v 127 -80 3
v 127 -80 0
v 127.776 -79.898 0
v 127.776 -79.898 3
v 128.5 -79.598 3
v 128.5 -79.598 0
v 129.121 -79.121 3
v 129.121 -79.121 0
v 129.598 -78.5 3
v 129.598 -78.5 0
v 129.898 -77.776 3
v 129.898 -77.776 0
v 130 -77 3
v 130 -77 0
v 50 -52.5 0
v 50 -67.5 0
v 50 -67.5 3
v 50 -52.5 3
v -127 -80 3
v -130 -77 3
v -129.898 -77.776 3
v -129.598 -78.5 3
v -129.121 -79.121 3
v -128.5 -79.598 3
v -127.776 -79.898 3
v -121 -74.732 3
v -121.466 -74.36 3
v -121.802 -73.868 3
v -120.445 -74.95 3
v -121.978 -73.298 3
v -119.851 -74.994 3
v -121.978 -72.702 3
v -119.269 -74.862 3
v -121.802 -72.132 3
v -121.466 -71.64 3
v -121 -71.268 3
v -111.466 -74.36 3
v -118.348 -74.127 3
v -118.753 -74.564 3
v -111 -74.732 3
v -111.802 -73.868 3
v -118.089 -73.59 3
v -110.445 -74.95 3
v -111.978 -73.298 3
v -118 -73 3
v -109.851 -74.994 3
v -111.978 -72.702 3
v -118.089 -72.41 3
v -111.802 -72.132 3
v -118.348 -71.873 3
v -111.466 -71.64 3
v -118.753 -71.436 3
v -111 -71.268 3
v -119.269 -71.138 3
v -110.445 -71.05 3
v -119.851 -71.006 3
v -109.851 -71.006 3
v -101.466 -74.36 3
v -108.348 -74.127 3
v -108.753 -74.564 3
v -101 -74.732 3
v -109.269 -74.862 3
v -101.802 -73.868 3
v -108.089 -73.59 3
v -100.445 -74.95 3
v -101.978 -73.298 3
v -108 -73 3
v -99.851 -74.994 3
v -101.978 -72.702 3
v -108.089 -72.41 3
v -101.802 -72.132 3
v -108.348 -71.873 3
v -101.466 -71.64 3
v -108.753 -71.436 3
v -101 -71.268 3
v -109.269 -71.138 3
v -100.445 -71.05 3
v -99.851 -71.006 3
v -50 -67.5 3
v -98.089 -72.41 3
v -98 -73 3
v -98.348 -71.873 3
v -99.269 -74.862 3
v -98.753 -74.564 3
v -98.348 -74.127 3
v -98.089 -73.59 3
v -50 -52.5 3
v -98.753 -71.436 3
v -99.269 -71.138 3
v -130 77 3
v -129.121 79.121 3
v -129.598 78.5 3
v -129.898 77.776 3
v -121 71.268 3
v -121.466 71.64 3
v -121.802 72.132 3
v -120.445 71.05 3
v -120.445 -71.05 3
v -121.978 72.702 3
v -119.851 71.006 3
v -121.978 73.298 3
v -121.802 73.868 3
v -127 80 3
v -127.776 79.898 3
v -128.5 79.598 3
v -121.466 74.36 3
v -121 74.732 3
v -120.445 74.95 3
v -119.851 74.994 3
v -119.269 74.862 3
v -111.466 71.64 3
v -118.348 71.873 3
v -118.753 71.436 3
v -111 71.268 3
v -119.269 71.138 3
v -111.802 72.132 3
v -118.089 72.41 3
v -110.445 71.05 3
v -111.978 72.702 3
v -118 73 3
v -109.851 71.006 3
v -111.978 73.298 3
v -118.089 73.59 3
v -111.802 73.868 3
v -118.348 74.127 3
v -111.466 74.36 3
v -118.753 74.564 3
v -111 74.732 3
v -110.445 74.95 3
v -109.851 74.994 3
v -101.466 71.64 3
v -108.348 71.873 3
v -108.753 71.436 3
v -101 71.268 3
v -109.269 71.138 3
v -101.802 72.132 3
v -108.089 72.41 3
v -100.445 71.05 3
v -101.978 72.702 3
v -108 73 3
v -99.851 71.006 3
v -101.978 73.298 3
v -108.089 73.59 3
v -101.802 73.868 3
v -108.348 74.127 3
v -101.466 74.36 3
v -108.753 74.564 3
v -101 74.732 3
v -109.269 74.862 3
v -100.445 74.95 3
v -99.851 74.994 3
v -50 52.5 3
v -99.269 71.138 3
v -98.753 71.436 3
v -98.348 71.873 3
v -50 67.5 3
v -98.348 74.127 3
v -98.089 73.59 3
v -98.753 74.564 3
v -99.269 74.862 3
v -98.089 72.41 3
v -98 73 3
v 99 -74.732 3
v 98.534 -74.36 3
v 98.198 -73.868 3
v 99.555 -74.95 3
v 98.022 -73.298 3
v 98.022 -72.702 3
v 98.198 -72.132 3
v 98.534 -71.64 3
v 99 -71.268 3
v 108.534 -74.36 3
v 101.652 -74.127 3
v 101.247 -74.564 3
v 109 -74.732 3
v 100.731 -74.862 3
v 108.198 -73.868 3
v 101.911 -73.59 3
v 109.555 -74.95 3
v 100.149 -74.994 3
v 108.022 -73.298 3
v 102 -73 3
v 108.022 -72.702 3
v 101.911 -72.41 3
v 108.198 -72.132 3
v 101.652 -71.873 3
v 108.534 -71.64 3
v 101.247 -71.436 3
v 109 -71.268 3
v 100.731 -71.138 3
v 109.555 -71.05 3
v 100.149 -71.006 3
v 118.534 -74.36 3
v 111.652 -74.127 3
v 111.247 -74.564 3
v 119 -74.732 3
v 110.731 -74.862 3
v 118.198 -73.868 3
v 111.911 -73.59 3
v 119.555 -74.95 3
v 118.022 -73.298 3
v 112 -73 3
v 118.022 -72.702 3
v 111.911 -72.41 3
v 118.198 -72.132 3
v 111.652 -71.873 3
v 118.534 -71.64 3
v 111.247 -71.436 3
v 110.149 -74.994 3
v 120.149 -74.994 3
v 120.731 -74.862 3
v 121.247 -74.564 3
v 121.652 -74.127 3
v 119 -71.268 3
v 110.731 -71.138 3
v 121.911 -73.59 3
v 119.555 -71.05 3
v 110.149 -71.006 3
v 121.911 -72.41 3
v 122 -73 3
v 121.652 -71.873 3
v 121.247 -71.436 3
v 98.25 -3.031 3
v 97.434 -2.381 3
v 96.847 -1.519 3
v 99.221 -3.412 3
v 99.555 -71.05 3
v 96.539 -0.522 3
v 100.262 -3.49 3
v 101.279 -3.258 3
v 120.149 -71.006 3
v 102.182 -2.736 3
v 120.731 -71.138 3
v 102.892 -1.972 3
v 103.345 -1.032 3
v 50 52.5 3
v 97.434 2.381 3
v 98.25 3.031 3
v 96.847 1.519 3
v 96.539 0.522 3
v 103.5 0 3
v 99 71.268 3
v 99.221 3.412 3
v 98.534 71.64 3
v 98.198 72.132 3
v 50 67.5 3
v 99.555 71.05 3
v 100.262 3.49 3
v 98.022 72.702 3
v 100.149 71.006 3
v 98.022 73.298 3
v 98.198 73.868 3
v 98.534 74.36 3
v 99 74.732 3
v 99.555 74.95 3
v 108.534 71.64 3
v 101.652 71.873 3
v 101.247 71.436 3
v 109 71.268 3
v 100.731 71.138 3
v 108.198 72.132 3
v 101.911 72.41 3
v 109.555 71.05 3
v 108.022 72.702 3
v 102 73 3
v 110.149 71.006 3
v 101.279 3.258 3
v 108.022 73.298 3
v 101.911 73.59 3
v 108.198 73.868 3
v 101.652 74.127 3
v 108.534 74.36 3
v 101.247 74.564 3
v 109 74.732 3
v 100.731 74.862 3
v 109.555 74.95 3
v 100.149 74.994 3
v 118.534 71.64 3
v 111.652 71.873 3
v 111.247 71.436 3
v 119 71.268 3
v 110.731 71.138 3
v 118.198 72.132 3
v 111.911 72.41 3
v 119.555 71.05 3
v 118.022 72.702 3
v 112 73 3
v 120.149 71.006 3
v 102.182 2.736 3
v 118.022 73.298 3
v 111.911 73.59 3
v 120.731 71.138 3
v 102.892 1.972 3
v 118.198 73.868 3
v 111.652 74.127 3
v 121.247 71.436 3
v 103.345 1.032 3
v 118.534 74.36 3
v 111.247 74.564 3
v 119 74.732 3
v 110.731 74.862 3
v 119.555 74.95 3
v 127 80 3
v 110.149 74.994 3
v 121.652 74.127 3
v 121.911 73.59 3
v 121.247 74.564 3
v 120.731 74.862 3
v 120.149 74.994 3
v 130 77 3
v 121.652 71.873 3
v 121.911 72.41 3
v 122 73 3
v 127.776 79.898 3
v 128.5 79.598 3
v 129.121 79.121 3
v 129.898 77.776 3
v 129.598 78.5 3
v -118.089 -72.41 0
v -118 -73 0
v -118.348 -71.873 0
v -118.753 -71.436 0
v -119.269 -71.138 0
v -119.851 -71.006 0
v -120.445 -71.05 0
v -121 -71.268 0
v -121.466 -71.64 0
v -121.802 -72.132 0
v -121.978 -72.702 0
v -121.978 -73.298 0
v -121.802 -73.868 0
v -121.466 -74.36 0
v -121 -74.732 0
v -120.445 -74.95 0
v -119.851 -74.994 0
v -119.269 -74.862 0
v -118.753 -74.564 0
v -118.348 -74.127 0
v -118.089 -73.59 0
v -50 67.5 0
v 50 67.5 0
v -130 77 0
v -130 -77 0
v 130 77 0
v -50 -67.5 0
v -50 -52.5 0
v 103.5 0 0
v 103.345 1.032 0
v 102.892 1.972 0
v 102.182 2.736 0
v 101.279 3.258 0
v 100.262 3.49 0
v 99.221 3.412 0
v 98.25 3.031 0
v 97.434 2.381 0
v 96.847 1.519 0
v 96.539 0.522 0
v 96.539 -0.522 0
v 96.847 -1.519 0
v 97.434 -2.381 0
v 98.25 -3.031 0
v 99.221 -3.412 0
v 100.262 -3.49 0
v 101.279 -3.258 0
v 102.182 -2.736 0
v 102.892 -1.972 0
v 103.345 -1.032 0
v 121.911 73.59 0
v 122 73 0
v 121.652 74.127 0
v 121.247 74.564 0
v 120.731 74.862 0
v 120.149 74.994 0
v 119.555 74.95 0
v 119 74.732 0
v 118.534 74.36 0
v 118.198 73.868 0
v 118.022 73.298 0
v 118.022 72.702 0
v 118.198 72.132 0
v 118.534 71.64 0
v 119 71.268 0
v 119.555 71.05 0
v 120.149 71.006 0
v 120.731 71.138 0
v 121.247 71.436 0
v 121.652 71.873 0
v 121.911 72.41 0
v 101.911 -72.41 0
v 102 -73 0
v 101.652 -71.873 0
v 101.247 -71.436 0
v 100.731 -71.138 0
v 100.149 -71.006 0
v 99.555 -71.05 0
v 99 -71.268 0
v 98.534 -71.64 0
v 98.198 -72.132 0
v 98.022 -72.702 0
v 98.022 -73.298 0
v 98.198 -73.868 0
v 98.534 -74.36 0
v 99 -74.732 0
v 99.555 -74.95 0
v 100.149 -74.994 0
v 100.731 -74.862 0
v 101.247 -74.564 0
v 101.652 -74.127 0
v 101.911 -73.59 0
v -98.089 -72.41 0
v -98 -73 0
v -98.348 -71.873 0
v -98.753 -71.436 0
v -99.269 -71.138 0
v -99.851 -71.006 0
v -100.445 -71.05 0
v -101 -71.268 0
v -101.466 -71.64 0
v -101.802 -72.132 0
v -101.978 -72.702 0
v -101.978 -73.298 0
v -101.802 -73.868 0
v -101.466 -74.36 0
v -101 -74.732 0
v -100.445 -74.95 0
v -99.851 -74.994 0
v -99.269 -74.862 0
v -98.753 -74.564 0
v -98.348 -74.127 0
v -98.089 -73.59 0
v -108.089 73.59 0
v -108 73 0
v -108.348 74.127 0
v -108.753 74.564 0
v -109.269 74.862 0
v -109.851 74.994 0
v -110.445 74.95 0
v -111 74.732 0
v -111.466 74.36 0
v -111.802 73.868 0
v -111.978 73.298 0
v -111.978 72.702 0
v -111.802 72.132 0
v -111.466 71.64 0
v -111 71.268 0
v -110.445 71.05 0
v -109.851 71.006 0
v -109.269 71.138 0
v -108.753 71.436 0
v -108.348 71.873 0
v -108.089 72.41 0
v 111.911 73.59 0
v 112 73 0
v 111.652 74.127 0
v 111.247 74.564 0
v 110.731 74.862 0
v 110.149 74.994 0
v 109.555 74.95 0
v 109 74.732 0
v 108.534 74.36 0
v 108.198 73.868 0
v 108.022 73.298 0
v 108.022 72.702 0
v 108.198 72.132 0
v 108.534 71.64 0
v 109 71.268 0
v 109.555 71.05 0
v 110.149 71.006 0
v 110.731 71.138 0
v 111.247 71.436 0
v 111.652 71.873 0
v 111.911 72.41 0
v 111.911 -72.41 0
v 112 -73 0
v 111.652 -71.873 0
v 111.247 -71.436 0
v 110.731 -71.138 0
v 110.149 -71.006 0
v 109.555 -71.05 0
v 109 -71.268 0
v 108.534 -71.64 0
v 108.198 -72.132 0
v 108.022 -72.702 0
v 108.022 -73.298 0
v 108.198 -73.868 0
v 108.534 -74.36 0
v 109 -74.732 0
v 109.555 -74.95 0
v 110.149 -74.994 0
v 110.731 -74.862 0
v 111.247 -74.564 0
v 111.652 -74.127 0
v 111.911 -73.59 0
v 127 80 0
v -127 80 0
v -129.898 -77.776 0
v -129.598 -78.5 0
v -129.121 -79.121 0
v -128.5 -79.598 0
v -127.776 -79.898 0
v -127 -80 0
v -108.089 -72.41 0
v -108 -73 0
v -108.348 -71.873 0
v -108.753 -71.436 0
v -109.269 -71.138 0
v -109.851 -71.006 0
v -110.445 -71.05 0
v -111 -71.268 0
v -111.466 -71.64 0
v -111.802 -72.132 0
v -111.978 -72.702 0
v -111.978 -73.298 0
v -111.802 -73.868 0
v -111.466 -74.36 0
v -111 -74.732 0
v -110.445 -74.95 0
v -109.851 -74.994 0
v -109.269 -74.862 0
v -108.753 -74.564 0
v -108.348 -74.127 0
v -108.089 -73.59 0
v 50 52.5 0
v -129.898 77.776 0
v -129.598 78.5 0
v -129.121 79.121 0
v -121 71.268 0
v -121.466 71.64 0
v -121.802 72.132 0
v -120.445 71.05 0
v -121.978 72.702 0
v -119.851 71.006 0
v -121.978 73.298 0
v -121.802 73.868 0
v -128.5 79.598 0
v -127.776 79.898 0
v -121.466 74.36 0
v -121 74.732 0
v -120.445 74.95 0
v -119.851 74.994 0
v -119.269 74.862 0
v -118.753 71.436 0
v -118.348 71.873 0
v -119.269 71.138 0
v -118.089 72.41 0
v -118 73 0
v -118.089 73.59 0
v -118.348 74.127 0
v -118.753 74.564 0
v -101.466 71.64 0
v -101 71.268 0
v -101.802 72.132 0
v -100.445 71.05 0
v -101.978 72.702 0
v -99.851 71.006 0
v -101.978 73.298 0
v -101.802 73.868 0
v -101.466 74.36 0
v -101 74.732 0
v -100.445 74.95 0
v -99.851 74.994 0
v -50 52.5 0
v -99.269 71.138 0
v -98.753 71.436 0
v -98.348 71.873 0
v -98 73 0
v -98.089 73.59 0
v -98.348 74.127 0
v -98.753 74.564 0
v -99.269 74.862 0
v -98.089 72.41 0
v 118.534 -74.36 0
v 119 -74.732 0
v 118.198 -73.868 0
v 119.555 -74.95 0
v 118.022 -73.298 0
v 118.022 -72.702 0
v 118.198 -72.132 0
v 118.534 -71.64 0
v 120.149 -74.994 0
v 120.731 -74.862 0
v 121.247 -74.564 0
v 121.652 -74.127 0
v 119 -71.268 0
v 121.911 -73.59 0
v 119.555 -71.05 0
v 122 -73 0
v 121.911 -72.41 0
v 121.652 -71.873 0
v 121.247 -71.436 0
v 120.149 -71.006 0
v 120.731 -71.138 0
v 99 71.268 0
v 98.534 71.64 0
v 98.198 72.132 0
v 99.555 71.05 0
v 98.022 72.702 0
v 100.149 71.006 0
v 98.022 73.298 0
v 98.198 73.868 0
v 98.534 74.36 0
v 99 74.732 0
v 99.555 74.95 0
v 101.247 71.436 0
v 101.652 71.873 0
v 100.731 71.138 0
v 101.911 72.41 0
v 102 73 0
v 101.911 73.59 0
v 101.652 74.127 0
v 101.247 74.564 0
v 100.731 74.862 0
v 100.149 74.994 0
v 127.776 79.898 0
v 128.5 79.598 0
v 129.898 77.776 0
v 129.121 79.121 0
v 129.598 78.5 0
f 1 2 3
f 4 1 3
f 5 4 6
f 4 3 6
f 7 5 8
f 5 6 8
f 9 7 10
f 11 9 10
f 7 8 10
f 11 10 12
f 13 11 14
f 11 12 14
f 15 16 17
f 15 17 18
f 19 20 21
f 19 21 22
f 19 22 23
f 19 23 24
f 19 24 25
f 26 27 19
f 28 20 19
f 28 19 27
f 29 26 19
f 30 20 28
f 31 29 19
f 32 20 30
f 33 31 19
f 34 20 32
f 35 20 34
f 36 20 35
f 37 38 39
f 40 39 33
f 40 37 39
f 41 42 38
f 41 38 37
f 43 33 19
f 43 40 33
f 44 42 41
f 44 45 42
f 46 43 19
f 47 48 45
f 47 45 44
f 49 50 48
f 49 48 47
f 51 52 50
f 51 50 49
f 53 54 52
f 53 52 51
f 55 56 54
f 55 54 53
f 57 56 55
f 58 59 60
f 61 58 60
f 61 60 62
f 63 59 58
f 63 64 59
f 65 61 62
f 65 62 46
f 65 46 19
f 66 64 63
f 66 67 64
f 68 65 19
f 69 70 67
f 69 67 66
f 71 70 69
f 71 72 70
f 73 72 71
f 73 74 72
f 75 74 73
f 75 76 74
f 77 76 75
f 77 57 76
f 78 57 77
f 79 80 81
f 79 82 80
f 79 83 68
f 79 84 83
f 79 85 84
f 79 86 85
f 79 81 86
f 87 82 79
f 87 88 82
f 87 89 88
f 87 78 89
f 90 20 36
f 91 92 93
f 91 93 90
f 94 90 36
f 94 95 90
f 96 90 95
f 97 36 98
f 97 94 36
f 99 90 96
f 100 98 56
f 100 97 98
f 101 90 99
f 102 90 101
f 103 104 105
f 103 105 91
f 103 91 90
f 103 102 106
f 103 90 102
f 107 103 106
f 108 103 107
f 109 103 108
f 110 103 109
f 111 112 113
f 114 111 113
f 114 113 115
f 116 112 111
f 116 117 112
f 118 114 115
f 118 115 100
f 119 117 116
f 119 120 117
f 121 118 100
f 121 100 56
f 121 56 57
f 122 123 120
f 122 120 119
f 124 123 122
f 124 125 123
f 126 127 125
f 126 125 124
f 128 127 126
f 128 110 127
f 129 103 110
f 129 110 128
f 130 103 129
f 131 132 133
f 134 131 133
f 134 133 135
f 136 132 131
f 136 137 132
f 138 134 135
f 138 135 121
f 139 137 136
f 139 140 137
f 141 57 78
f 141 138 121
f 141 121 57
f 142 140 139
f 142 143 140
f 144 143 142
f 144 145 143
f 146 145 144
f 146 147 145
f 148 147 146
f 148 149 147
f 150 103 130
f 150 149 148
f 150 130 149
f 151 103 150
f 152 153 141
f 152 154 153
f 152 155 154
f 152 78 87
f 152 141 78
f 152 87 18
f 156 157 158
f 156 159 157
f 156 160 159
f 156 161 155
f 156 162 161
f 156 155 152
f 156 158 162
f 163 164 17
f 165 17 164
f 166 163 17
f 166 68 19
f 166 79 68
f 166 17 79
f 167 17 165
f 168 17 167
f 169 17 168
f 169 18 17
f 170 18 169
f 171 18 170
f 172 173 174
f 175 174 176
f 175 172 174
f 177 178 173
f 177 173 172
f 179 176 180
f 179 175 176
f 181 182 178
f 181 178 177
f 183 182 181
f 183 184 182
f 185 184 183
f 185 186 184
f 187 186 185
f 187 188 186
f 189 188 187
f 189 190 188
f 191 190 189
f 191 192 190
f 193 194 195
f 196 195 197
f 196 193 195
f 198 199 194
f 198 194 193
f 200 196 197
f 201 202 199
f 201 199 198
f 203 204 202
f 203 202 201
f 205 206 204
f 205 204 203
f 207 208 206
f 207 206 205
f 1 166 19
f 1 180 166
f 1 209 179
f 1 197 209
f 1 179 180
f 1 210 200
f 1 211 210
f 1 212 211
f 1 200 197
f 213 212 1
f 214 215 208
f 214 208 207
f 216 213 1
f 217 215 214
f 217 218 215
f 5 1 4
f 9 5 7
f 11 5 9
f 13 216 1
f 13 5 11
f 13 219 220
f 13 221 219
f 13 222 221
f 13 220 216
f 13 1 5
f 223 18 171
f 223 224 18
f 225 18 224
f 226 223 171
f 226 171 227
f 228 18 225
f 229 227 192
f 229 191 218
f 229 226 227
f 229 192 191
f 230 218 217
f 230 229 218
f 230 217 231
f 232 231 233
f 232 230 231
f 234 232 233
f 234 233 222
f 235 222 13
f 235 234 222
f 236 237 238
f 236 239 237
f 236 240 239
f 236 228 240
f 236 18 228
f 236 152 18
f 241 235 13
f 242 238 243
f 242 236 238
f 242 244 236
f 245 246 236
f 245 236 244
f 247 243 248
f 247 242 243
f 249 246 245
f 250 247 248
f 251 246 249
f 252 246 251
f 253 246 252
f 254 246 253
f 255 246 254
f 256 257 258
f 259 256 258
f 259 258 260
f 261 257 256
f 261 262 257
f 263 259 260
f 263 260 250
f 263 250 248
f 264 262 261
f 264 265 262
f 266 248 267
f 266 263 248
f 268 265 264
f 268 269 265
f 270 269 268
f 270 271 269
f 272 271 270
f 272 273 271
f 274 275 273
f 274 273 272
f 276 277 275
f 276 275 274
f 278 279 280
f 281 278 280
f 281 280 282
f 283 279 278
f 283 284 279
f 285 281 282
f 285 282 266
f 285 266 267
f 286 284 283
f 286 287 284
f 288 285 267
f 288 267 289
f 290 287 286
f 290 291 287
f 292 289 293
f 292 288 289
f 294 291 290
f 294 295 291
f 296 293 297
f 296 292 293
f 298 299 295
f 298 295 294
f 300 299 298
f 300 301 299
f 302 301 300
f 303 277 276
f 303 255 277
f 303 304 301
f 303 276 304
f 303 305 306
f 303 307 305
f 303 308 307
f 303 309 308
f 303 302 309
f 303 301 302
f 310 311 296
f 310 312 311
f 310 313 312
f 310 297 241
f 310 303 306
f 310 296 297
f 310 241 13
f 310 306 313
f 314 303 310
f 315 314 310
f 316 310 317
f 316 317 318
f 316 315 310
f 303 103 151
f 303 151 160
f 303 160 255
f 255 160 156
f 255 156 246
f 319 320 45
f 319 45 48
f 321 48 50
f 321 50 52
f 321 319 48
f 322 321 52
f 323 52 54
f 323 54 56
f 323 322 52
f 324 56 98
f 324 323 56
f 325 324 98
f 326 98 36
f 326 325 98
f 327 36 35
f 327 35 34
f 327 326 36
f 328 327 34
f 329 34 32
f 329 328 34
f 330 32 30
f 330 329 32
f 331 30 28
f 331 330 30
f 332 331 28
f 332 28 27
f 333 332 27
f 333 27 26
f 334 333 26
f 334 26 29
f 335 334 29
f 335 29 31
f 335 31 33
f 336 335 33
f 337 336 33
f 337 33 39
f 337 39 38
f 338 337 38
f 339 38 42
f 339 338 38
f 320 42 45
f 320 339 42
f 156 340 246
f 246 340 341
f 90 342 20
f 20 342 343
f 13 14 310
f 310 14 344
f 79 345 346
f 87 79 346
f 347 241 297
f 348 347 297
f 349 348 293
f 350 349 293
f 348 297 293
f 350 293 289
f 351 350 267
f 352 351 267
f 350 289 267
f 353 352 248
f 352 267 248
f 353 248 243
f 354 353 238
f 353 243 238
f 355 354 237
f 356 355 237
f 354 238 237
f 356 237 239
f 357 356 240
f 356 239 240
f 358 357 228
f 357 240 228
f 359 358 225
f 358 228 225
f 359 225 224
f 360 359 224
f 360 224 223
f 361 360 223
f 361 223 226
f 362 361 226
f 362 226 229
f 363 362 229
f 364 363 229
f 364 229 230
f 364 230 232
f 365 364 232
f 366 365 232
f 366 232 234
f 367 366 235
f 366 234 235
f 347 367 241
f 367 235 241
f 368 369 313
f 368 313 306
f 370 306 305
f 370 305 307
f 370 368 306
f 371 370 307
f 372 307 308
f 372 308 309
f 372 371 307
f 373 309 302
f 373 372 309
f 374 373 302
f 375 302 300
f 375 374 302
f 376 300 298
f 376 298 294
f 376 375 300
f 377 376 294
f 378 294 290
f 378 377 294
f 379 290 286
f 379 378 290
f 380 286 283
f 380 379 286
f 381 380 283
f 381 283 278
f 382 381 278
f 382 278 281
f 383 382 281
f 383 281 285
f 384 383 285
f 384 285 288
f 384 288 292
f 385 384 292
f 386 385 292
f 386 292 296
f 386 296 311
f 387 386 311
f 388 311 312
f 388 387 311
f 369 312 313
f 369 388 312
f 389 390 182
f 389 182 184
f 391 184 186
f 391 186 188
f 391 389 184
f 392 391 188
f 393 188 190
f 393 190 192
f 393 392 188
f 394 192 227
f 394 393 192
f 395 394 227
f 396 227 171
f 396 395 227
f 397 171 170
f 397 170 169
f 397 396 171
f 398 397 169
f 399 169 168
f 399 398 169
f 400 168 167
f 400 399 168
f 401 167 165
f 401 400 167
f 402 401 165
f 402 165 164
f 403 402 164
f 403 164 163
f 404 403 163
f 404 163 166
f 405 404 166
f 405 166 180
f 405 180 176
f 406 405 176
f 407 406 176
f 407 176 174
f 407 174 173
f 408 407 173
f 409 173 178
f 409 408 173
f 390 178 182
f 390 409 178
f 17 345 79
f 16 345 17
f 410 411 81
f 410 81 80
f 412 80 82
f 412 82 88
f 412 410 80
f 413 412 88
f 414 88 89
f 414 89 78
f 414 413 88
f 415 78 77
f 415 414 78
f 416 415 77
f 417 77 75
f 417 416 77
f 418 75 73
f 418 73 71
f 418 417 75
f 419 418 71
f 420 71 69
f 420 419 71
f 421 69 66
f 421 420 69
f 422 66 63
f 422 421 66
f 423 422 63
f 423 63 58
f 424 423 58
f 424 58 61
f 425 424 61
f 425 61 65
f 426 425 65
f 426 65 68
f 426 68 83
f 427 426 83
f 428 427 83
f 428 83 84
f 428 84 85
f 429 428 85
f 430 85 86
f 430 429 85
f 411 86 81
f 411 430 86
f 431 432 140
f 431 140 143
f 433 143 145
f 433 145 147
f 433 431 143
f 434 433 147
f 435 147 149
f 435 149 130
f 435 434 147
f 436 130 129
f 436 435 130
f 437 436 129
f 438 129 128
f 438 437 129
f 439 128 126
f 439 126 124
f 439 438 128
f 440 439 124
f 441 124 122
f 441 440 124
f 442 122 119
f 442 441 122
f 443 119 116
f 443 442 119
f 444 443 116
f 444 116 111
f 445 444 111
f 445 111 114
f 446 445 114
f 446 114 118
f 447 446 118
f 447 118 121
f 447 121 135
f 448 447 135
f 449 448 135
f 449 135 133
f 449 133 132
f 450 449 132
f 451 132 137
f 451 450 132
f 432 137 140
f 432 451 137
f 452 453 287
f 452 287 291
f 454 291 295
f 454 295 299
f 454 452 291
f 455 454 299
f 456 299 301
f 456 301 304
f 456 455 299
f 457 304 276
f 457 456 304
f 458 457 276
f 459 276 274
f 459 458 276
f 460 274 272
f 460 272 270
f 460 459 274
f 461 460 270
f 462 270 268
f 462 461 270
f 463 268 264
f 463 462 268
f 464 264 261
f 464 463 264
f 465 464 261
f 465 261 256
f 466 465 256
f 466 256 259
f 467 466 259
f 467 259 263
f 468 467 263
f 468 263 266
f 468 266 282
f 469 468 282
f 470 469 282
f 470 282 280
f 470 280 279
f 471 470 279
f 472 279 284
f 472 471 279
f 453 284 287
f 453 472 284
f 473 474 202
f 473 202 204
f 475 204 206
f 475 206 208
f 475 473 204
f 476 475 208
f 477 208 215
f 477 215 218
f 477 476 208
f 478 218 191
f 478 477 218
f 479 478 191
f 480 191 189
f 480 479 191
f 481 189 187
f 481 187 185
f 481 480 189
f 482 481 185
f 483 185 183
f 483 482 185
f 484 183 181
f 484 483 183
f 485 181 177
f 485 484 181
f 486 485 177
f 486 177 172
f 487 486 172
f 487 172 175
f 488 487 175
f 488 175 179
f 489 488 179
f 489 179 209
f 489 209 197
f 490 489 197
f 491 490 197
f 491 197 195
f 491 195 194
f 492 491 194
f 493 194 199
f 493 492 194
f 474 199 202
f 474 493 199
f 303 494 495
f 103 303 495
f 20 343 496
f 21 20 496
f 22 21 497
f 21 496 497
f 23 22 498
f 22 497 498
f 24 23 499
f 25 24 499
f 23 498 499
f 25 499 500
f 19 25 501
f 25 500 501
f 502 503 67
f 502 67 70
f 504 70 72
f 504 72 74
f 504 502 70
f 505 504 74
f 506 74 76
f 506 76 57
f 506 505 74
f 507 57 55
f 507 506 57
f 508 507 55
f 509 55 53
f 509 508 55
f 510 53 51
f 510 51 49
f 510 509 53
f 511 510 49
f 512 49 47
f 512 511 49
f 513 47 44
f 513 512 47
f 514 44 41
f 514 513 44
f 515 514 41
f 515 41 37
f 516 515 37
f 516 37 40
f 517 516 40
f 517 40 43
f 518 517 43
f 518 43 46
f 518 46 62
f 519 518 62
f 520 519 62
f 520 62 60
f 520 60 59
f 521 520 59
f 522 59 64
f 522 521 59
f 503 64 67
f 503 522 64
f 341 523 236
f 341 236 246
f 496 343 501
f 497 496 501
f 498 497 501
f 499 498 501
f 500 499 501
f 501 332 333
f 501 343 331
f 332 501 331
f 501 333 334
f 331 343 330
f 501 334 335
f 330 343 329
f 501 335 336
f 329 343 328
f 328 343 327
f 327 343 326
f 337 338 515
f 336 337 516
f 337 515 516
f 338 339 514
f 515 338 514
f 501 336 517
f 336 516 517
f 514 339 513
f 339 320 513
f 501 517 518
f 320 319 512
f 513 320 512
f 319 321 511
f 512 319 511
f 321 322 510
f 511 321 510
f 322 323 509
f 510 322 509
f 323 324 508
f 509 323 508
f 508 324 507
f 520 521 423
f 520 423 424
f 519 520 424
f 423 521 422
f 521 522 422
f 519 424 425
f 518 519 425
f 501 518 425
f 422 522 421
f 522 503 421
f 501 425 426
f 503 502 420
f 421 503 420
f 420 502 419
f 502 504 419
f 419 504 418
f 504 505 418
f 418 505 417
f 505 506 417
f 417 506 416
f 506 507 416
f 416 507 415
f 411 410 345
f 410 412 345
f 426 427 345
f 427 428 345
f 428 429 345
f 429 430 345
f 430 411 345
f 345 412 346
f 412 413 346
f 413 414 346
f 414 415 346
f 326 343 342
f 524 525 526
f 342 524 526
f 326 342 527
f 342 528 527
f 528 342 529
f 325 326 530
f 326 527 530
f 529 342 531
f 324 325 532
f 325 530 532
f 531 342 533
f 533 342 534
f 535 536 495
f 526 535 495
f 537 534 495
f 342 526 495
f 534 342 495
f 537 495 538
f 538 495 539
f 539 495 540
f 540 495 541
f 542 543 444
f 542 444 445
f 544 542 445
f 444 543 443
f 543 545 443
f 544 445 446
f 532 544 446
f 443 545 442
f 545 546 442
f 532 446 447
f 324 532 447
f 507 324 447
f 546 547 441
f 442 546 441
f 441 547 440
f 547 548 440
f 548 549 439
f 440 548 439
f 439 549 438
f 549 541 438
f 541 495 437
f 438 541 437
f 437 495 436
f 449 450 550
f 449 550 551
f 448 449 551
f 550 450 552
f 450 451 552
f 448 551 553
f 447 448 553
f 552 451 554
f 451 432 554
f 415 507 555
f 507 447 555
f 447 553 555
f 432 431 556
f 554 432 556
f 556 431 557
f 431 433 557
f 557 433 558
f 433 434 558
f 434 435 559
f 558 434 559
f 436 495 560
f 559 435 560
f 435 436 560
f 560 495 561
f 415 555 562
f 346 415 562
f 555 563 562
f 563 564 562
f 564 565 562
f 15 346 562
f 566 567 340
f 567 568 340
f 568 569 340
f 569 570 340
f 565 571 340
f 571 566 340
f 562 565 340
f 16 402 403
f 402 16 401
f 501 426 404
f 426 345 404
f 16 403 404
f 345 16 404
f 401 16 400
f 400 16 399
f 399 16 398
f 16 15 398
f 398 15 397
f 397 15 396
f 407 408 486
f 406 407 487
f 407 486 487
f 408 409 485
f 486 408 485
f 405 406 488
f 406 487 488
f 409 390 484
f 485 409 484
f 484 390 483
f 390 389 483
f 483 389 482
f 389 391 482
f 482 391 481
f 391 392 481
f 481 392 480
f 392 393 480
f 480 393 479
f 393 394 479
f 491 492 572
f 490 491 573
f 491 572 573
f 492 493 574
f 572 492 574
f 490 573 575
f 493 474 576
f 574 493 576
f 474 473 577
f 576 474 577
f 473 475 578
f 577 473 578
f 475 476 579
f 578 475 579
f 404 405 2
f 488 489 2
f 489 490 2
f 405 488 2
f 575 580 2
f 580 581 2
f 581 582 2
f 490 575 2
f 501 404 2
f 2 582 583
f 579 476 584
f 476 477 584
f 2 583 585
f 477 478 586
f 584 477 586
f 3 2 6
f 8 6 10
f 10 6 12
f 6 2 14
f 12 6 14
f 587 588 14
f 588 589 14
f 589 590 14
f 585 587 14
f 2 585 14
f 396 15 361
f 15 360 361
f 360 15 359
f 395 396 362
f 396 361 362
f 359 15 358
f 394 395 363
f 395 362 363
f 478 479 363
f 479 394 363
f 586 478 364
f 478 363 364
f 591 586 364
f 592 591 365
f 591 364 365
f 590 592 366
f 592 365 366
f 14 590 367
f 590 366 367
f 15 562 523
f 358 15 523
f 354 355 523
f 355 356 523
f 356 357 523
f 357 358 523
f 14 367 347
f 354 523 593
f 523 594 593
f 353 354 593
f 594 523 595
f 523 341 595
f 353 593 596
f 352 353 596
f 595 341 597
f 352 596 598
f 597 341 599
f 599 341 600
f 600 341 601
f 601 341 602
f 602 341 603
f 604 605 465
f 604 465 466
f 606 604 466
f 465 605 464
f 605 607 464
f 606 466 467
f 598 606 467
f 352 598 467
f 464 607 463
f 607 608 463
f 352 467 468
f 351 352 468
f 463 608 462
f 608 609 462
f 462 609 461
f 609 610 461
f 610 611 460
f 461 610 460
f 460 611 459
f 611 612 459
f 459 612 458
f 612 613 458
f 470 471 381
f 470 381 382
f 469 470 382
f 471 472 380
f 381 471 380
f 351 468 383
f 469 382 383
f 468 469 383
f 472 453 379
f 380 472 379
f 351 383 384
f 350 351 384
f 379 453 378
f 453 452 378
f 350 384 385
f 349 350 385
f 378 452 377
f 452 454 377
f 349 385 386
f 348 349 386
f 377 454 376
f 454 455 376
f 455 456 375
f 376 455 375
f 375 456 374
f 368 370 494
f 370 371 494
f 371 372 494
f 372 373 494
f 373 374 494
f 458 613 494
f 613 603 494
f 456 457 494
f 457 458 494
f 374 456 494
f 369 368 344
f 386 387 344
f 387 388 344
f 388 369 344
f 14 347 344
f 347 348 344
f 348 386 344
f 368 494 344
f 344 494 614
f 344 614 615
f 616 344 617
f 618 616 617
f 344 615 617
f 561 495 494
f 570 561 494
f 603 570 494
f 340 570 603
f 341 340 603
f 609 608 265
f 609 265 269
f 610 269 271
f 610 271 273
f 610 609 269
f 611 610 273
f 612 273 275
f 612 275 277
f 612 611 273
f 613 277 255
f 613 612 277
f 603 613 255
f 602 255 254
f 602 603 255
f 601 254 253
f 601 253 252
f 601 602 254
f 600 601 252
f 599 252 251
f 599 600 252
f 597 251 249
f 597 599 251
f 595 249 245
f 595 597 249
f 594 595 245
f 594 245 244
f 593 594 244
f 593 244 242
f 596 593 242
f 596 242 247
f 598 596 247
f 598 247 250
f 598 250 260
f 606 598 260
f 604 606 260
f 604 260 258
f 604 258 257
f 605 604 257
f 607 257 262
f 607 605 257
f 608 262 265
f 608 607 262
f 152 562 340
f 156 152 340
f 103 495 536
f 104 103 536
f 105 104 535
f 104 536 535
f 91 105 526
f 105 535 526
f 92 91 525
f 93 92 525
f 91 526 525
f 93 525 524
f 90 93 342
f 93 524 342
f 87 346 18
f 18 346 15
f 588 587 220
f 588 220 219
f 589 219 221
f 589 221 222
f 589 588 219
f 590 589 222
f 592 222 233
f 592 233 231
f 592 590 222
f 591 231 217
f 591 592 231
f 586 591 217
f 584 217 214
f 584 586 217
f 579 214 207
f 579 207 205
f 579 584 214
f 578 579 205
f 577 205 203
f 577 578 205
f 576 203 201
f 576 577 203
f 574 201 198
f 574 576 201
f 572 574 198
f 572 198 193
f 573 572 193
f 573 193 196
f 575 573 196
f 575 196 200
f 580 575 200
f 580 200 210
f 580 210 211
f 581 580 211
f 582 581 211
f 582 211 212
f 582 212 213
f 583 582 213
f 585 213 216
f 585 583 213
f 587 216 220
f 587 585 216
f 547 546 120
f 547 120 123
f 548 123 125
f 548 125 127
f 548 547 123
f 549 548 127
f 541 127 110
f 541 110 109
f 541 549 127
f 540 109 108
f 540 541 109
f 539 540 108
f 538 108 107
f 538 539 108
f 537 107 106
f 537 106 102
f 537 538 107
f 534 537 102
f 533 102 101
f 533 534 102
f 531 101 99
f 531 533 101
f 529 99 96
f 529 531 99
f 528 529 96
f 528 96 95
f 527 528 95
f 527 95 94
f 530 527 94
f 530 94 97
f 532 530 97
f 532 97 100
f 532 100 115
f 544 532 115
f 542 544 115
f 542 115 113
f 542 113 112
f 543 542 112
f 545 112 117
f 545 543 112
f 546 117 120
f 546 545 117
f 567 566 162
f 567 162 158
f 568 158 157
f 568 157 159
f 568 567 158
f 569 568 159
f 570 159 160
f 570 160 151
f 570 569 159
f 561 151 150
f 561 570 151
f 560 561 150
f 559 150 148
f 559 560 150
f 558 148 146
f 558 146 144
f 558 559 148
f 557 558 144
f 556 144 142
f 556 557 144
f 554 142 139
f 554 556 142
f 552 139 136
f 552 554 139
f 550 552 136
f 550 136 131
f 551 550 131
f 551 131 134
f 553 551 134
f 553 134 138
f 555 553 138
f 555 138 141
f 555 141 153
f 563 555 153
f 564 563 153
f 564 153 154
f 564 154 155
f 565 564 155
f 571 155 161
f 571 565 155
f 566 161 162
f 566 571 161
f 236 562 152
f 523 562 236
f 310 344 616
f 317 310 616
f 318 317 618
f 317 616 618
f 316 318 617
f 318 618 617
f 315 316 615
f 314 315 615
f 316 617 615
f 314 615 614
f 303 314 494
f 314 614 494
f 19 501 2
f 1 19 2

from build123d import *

# Parameters (mm, degrees)
MODEL_R             = 1.5
MODEL_R_2           = 2
MODEL_W             = 40
MODEL_H             = 40
MODEL_W_2           = 100
MODEL_H_2           = 15
EXTRUDE_1_DEPTH     = 3
SKETCH_2_W          = 96.919809602
SKETCH_2_H          = 88.226620572
EXTRUDE_2_DEPTH     = 3
SKETCH_3_W          = 55.118517674
SKETCH_3_H          = 61.40720761
EXTRUDE_3_DEPTH     = 3
SKETCH_4_R          = 3.5
CUT_EXTRUDE_4_DEPTH = 3
SKETCH_5_W          = 51.049365362
SKETCH_5_H          = 59.002708518
EXTRUDE_4_DEPTH     = 3


with BuildPart() as part:
    # Model → 凸台-拉伸1 (new body)
    with BuildSketch(Plane.XY):
        with BuildLine():
            Line((130, -77), (130, 77))
            ThreePointArc((130, 77), (129.121320344, 79.121320344), (127, 80))
            Line((127, 80), (-127, 80))
            ThreePointArc((-127, 80), (-129.121320344, 79.121320344), (-130, 77))
            Line((-130, 77), (-130, -77))
            ThreePointArc((-130, -77), (-129.121320344, -79.121320344), (-127, -80))
            Line((-127, -80), (127, -80))
            ThreePointArc((127, -80), (129.121320344, -79.121320344), (130, -77))
        make_face()
        with Locations((0, 40.4)):
            Circle(MODEL_R, mode=Mode.SUBTRACT)
        with Locations((40.4, 0)):
            Circle(MODEL_R, mode=Mode.SUBTRACT)
        with Locations((0, -40.4)):
            Circle(MODEL_R, mode=Mode.SUBTRACT)
        with Locations((-40.4, 0)):
            Circle(MODEL_R, mode=Mode.SUBTRACT)
        with Locations((-110, 73)):
            Circle(MODEL_R_2, mode=Mode.SUBTRACT)
        with Locations((110, 73)):
            Circle(MODEL_R_2, mode=Mode.SUBTRACT)
        with Locations((110, -73)):
            Circle(MODEL_R_2, mode=Mode.SUBTRACT)
        with Locations((-110, -73)):
            Circle(MODEL_R_2, mode=Mode.SUBTRACT)
        with Locations((-120, 73)):
            Circle(MODEL_R_2, mode=Mode.SUBTRACT)
        with Locations((120, 73)):
            Circle(MODEL_R_2, mode=Mode.SUBTRACT)
        with Locations((-120, -73)):
            Circle(MODEL_R_2, mode=Mode.SUBTRACT)
        with Locations((120, -73)):
            Circle(MODEL_R_2, mode=Mode.SUBTRACT)
        with Locations((-100, 73)):
            Circle(MODEL_R_2, mode=Mode.SUBTRACT)
        with Locations((100, 73)):
            Circle(MODEL_R_2, mode=Mode.SUBTRACT)
        with Locations((100, -73)):
            Circle(MODEL_R_2, mode=Mode.SUBTRACT)
        with Locations((-100, -73)):
            Circle(MODEL_R_2, mode=Mode.SUBTRACT)
        with Locations((-90, 0)):
            Rectangle(MODEL_W, MODEL_H, mode=Mode.SUBTRACT)
        with Locations((90, 0)):
            Rectangle(MODEL_W, MODEL_H, mode=Mode.SUBTRACT)
        with Locations((0, 60)):
            Rectangle(MODEL_W_2, MODEL_H_2, mode=Mode.SUBTRACT)
        with Locations((0, -60)):
            Rectangle(MODEL_W_2, MODEL_H_2, mode=Mode.SUBTRACT)
        with BuildLine():
            Line((28.543233286, -28.543233286), (28.543233286, -23.543233286))
            ThreePointArc((28.543233286, -23.543233286), (-26.162950904, 26.162950904), (23.543233286, -28.543233286))
            Line((23.543233286, -28.543233286), (28.543233286, -28.543233286))
        make_face(mode=Mode.SUBTRACT)
    extrude(amount=EXTRUDE_1_DEPTH)

    # 草图2 → 凸台-拉伸2 (add)
    with BuildSketch(Plane.XY.offset(3)):
        Rectangle(SKETCH_2_W, SKETCH_2_H)
    extrude(amount=-EXTRUDE_2_DEPTH)

    # 草图3 → 凸台-拉伸3 (add)
    with BuildSketch(Plane.XY.offset(3)):
        with Locations((88.781504979, -1.572172484)):
            Rectangle(SKETCH_3_W, SKETCH_3_H)
    extrude(amount=-EXTRUDE_3_DEPTH)

    # 草图4 → 切除-拉伸4 (cut)
    with BuildSketch(Plane.XY.offset(3)):
        with Locations((100, 0)):
            Circle(SKETCH_4_R)
    extrude(amount=-CUT_EXTRUDE_4_DEPTH, mode=Mode.SUBTRACT)

    # 草图5 → 凸台-拉伸4 (add)
    with BuildSketch(Plane.XY.offset(3)):
        with Locations((-90.446158197, 0)):
            Rectangle(SKETCH_5_W, SKETCH_5_H)
    extrude(amount=-EXTRUDE_4_DEPTH)


solid = part.part
